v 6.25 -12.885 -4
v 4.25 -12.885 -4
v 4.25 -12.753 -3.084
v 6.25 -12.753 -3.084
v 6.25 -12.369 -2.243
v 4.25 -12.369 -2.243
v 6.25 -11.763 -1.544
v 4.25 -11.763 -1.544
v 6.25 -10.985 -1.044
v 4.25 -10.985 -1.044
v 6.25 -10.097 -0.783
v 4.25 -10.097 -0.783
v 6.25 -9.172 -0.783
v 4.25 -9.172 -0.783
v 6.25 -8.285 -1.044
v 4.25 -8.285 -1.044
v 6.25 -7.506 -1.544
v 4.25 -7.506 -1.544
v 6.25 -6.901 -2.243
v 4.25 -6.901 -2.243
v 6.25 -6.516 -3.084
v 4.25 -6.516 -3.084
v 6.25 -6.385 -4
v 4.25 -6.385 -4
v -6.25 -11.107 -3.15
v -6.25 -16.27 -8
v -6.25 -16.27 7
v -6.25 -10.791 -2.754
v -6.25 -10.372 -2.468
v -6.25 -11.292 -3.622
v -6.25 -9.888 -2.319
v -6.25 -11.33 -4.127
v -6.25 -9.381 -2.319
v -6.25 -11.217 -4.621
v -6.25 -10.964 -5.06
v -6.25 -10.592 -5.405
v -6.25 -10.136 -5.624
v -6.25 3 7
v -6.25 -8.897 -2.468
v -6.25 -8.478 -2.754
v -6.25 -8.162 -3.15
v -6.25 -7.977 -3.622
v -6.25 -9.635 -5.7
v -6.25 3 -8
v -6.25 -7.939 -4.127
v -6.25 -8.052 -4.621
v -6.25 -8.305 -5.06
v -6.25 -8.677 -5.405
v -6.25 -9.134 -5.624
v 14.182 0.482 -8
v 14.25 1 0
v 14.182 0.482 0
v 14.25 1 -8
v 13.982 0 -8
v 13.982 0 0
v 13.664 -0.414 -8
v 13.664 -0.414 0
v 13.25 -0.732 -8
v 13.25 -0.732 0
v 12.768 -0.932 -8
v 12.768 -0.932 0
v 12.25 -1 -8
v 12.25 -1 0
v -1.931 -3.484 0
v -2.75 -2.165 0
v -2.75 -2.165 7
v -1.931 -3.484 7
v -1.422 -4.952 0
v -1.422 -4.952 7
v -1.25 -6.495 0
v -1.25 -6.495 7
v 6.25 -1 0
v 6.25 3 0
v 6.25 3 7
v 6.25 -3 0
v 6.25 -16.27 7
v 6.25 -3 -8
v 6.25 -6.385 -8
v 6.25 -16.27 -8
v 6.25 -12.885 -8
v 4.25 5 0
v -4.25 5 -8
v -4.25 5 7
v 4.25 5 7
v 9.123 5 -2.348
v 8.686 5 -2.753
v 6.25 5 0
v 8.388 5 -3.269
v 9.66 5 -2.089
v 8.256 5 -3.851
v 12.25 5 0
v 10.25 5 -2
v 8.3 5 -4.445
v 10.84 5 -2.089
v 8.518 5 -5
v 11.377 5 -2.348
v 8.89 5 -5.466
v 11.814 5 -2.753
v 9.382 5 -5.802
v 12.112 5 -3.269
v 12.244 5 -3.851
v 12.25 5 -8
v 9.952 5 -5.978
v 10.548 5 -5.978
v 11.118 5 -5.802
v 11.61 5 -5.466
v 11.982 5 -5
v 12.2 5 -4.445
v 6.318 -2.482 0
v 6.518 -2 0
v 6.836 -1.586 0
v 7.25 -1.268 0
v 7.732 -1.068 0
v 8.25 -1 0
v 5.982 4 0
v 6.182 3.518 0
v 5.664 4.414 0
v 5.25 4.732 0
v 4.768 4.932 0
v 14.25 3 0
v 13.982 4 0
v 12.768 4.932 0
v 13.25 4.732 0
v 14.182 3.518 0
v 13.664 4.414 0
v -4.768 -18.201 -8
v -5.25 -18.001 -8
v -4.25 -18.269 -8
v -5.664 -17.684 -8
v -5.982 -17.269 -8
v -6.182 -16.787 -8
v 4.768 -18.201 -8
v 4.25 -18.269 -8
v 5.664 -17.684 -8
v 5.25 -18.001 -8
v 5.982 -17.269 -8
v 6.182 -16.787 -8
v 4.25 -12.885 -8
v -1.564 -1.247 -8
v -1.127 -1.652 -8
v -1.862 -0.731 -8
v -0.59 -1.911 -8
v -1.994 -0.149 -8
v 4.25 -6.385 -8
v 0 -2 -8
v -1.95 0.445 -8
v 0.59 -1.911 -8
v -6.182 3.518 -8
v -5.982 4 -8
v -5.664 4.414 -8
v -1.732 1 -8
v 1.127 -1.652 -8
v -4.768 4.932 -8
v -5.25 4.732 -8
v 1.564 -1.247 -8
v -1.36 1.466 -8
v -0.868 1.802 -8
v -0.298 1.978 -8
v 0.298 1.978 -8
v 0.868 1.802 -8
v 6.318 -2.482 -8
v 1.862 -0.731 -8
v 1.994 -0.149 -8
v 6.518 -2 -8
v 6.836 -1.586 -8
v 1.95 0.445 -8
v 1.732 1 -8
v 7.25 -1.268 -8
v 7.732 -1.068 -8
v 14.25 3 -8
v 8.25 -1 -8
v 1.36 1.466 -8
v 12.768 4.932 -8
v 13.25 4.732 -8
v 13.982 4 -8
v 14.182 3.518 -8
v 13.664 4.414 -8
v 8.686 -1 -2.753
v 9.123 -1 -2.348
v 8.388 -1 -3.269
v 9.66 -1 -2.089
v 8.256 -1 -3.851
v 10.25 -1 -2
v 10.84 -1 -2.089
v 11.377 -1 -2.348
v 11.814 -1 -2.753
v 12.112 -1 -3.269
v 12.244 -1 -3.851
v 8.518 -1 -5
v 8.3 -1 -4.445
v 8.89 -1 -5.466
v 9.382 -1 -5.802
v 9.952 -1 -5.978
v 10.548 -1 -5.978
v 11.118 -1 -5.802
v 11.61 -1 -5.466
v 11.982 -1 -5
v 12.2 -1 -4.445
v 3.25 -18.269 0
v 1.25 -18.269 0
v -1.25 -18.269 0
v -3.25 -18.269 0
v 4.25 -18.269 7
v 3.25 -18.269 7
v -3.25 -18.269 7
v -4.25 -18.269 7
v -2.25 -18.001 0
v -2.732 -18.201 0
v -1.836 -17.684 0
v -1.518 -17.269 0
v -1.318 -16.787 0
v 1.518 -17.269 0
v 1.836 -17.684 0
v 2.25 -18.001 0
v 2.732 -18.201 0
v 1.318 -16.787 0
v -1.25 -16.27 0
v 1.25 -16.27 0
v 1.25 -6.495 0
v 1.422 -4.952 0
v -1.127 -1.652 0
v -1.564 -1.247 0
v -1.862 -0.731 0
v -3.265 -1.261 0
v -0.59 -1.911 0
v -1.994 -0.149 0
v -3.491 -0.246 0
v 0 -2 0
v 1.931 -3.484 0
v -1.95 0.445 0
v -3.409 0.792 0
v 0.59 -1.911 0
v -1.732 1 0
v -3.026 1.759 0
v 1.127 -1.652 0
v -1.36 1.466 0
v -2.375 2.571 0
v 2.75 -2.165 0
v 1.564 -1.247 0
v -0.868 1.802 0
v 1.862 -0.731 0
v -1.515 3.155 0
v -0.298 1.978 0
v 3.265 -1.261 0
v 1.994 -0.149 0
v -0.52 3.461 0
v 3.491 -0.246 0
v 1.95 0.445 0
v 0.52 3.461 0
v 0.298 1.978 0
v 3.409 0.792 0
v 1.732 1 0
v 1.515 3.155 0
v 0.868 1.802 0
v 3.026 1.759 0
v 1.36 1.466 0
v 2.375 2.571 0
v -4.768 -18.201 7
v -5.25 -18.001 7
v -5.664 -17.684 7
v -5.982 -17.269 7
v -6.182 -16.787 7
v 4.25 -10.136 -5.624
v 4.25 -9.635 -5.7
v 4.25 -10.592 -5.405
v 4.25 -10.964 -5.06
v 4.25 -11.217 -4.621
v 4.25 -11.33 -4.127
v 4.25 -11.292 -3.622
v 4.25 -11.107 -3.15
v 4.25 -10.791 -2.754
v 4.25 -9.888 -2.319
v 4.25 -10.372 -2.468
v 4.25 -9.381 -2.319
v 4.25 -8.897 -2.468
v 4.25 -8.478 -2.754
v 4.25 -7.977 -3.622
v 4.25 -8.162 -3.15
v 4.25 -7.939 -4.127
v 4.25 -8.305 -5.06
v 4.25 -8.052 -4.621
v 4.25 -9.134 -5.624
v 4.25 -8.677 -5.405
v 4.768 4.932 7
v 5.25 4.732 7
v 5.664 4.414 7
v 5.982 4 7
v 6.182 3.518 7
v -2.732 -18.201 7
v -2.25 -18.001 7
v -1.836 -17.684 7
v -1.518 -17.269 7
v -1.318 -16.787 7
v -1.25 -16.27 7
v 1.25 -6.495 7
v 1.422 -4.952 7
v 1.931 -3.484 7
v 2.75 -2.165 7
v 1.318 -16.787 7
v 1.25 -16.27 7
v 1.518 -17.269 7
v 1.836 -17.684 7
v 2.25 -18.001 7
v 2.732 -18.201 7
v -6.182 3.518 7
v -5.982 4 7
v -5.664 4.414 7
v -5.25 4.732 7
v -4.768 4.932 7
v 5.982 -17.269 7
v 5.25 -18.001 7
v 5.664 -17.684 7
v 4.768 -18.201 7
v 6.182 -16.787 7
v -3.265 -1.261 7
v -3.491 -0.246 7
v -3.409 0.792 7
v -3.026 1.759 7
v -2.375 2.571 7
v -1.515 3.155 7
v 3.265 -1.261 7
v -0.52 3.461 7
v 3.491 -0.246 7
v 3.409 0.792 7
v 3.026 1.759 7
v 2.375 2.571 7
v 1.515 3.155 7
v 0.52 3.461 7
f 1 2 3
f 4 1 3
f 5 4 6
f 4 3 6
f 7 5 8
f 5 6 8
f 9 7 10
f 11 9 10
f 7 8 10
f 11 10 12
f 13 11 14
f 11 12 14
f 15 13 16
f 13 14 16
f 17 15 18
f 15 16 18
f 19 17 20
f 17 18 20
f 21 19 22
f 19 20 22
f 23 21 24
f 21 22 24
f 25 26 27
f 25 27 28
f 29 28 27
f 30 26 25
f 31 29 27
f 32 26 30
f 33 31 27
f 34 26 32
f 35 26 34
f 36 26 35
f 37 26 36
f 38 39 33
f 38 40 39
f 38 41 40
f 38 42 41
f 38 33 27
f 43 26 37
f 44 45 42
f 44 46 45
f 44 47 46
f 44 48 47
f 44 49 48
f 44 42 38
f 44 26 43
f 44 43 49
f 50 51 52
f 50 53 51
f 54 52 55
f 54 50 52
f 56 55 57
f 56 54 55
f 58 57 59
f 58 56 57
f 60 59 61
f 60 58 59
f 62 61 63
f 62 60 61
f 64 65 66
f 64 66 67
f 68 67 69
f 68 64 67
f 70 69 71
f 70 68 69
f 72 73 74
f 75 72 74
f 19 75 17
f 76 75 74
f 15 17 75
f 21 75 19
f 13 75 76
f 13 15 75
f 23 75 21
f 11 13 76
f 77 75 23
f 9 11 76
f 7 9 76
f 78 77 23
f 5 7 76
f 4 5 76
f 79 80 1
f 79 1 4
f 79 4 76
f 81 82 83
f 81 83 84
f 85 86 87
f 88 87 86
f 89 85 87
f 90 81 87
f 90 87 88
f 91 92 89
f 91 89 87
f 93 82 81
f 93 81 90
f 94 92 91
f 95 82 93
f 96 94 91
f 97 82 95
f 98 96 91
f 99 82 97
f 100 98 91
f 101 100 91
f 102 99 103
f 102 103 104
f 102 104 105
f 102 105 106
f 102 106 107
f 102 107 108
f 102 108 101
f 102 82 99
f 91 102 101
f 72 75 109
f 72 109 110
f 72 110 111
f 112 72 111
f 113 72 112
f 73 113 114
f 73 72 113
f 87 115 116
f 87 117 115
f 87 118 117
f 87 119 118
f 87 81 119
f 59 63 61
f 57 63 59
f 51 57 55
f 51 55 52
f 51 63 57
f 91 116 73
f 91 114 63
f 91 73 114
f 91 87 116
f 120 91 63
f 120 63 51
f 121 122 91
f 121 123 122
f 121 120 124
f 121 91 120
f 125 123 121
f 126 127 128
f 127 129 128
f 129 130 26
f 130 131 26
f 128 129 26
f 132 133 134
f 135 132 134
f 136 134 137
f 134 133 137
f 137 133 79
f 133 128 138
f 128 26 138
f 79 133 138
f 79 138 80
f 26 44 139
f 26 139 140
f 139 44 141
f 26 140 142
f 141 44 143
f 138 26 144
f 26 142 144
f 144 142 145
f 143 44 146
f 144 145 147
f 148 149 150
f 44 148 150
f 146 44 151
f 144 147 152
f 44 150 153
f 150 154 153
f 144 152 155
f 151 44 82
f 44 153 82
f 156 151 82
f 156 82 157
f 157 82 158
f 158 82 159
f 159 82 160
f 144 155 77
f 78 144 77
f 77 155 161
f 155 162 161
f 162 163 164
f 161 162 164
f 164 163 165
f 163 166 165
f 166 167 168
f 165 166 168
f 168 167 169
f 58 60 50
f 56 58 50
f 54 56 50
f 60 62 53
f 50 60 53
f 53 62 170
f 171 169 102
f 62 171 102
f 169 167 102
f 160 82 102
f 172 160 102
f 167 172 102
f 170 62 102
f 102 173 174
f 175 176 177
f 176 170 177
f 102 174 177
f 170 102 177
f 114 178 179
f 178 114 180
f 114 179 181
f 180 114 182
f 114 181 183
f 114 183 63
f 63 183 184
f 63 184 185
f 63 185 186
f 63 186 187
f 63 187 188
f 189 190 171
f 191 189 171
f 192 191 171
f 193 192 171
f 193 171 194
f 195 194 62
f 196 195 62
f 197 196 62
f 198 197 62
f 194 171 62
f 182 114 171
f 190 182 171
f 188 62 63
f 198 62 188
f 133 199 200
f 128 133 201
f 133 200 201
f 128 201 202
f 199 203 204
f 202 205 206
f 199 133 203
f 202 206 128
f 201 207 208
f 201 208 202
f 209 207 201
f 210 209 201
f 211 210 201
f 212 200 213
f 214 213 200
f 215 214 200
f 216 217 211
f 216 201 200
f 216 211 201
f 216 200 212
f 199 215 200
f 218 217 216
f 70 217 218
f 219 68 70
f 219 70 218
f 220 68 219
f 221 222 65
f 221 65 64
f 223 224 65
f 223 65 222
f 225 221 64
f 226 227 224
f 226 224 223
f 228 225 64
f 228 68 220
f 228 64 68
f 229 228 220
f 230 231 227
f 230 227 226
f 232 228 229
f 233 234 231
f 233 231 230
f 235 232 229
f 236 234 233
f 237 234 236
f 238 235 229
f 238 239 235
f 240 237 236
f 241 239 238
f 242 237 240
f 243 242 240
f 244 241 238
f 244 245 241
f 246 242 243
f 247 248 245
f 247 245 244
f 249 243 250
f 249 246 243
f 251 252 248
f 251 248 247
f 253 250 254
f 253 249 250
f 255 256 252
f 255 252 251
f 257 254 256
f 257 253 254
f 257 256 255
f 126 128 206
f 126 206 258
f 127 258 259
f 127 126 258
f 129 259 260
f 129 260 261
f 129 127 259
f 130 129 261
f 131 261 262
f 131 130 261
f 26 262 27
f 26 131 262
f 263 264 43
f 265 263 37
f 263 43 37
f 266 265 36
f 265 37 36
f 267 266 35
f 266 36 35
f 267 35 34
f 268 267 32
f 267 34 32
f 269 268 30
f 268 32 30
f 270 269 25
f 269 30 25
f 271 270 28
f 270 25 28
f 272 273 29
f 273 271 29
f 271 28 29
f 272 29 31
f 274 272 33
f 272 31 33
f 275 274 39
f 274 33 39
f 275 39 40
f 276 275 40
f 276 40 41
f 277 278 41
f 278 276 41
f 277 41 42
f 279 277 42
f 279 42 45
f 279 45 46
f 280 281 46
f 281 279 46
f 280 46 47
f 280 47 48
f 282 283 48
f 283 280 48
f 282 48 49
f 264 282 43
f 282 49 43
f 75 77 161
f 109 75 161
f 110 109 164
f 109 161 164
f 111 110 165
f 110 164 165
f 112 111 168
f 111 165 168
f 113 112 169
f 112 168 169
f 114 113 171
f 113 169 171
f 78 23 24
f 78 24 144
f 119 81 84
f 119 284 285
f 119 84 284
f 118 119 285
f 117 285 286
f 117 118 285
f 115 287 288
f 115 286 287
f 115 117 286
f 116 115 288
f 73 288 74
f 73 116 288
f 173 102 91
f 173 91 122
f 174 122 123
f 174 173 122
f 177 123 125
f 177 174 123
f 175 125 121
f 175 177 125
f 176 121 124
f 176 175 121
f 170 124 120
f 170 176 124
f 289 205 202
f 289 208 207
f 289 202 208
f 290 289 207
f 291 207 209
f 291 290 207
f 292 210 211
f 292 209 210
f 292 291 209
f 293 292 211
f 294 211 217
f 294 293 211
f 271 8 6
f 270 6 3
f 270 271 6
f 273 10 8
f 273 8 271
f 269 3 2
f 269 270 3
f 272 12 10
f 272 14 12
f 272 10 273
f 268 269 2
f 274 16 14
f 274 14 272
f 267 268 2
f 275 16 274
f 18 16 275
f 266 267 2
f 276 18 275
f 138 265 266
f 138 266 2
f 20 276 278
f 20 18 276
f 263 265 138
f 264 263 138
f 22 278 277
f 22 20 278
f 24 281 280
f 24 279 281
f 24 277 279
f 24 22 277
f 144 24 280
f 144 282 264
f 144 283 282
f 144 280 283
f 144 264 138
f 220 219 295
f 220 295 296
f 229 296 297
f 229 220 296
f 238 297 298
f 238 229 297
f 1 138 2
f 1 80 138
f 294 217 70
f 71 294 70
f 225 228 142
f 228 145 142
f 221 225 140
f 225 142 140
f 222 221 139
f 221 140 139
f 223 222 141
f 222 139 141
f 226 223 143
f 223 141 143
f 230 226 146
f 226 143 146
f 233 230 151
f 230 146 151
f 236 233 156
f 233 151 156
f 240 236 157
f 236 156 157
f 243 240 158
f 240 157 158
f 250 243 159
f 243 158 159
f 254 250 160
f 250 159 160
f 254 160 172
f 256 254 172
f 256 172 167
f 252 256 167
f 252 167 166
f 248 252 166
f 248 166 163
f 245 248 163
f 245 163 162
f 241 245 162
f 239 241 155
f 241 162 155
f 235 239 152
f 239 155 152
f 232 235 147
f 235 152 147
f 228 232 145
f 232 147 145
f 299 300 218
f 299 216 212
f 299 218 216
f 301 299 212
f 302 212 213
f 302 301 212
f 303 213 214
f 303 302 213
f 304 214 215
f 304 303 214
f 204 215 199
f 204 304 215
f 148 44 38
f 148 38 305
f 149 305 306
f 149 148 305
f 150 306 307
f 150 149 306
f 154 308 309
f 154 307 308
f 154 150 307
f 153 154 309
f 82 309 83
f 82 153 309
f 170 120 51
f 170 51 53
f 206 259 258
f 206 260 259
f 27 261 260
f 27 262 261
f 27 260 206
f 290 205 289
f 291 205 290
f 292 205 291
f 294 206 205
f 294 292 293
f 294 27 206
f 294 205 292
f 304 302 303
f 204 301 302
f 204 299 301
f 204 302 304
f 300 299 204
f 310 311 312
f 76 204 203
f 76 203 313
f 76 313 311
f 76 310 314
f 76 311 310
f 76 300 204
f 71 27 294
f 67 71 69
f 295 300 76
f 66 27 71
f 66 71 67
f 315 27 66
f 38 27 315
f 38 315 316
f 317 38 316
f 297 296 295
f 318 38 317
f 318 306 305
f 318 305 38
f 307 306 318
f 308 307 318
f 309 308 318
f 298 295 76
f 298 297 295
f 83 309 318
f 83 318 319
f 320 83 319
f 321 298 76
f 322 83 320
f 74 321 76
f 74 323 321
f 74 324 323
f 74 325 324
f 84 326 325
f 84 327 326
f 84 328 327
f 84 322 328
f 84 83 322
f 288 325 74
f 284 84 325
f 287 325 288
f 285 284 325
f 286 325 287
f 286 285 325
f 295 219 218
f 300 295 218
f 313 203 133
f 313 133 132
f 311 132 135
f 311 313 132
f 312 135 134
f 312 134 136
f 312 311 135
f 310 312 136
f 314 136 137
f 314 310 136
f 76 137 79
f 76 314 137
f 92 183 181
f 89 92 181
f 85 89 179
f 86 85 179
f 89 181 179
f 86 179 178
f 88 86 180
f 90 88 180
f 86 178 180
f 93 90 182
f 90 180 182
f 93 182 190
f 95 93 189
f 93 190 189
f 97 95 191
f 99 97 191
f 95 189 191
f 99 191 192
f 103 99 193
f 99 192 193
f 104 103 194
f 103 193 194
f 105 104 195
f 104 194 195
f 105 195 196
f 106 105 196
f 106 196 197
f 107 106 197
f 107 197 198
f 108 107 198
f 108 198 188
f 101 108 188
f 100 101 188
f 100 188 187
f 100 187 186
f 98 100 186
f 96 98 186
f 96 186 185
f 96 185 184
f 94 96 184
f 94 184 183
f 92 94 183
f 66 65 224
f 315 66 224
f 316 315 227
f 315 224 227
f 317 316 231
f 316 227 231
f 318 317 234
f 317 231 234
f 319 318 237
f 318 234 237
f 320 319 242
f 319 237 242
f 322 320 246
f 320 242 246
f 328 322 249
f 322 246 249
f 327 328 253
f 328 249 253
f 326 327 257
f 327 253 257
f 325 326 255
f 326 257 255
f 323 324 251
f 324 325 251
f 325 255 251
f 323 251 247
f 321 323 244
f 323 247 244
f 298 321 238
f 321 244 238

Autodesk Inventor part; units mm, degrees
ref_plane "YZ Plane" through (0, 0, 0) normal (1, 0, 0) x (0, 1, 0)
ref_plane "XZ Plane" through (0, 0, 0) normal (0, 1, 0) x (-1, 0, 0)
sketch "Sketch14" plane through (0, 0, 0) normal (0, 0, 1) x (1, 0, 0)
  circle A0 centre (0, 0) radius 3.5
  line L0 (-1.25, -3.2692) -> (1.25, -3.2692)
  line L1 (1.25, -3.2692) -> (1.25, -18.2692)
  line L2 (1.25, -18.2692) -> (-1.25, -18.2692)
  line L3 (-1.25, -18.2692) -> (-1.25, -3.2692)
  arc A1 (-1.25, -6.4952) -> (-2.75, -2.1651) centre (-8.25, -6.4952) ccw
  arc A2 (2.75, -2.1651) -> (1.25, -6.4952) centre (8.25, -6.4952) ccw
  line L4 (-6.25, 5) -> (6.25, 5)
  line L5 (6.25, 5) -> (6.25, -18.2692)
  line L6 (6.25, -18.2692) -> (-6.25, -18.2692)
  line L7 (-6.25, -18.2692) -> (-6.25, 5)
  point P0 (-1.25, -18.2692)
  point P1 (1.25, -18.2692)
  point P2 (-1.25, -18.2692)
  dimension "d67" = 7
  dimension "d68" = 2.5
  dimension "d69" = 7
  dimension "d70" = 7
  dimension "d71" = 15
  dimension "d72" = 5
  dimension "d73" = 5
  dimension "d74" = 5
extrude "Extrusion8" add sketch "Sketch14" along normal blind 7 contours A0 A1 L3 L6 L7 L4 L5 L1 A2
extrude "Extrusion9" add sketch "Sketch14" against normal blind 8
hole "Hole12" at (0, 0, 0) direction (0, 0, -1) diameter 4 end through all
ref_plane "Work Plane4" through (-6.25, 2, 7) normal (0, 1, 0) x (1, 0, 0)
sketch "Sketch18" plane through (-6.25, 5, 7) normal (0, 1, 0) x (1, 0, 0)
  line L0 (12.5, 0) -> (12.5, 15) projected
  line L1 (12.5, 7) -> (20.5, 7)
  line L2 (20.5, 7) -> (20.5, 15)
  line L3 (20.5, 15) -> (12.5, 15)
  line L4 (12.5, 15) -> (12.5, 0)
  line L5 (0, 15) -> (12.5, 15) projected
  line L6 (20.5, 7) -> (12.5, 15) construction
  line L7 (19.25, 12.5877) -> (19.25, 9.4123)
  line L8 (19.25, 9.4123) -> (16.5, 7.8246)
  line L9 (16.5, 7.8246) -> (13.75, 9.4123)
  line L10 (13.75, 9.4123) -> (13.75, 12.5877)
  line L11 (13.75, 12.5877) -> (16.5, 14.1754)
  line L12 (16.5, 14.1754) -> (19.25, 12.5877)
  point P0 (6.25, 7)
  point P1 (16.5, 11)
  point P2 (16.5, 11)
  point P3 (12.5, 13)
  dimension "d112" = 8
  dimension "d113" = 5.5
  dimension "d139" = 8
extrude "Extrusion13" add sketch "Sketch18" against normal blind 6 contours L0 L3 L2 L1 | L7 L8 L9 L10 L11 L12
hole "Hole16" at (10.25, 5, -4) direction (0, -1, 0) diameter 4 end through all
sketch "Sketch19" plane through (6.25, -18.2692, 7) normal (1, 0, 0) x (0, 0, -1)
  line L0 (0, 0) -> (0, 11.774) projected
  line L1 (7, 0) -> (7, 11.774) projected
  line L2 (7, 11.774) -> (0, 11.774) projected
  line L3 (0, 0) -> (0, 11.774) projected
  line L4 (7, 0) -> (0, 0) projected
  line L5 (15, 17.2692) -> (7, 17.2692) projected
  line L6 (11, 8.6346) -> (11, 0) construction
  line L7 (7, 0) -> (15, 0) construction
  line L8 (15, 17.2692) -> (15, 0) construction
  line L9 (11, 8.6346) -> (11, 17.2692) construction
  point P0 (7, 18.2692)
hole "Hole15" at (6.25, -9.6346, -4) direction (-1, 0, 0) diameter 3.4 end through all counterbore diameter 6.5 counterbore depth 2
sketch "Sketch20" plane through (6.25, -18.2692, 7) normal (1, 0, 0) x (0, 0, -1)
  line L0 (15, 17.2692) -> (15, 0) projected
  circle A0 centre (11, 8.6346) radius 3.25 projected
  circle A1 centre (11, 8.6346) radius 1.7 projected
  circle A2 centre (11, 8.6346) radius 3.25 projected
  line L1 (11, 5.3846) -> (11, 11.8846)
  line L2 (11, 11.8846) -> (15, 11.8846)
  line L3 (15, 11.8846) -> (15, 5.3846)
  line L4 (15, 5.3846) -> (11, 5.3846)
  point P0 (7, 18.2692)
extrude "Extrusion14" cut sketch "Sketch20" against normal up to surface (2 mm away) contours L0 L4 A0 L2 | A0 L1 A1 | A1 L1 picked at (13.692, 8.2674) picked at (11.6055, 9.0776)
fillet "Fillet3" radius 2 9 edges at (14.25, -1, -4) (-6.25, 5, -0.5) (-6.25, -18.2692, -0.5) (6.25, -18.2692, -0.5) (-1.25, -18.2692, 3.5) (1.25, -18.2692, 3.5) (6.25, -1, -4) (14.25, 5, -4) (6.25, 5, 3.5)
equation "\"d69\" = d67"
equation "\"d70\" = d67"
equation "\"d73\" = d72"
properties part number "z belt clip"
